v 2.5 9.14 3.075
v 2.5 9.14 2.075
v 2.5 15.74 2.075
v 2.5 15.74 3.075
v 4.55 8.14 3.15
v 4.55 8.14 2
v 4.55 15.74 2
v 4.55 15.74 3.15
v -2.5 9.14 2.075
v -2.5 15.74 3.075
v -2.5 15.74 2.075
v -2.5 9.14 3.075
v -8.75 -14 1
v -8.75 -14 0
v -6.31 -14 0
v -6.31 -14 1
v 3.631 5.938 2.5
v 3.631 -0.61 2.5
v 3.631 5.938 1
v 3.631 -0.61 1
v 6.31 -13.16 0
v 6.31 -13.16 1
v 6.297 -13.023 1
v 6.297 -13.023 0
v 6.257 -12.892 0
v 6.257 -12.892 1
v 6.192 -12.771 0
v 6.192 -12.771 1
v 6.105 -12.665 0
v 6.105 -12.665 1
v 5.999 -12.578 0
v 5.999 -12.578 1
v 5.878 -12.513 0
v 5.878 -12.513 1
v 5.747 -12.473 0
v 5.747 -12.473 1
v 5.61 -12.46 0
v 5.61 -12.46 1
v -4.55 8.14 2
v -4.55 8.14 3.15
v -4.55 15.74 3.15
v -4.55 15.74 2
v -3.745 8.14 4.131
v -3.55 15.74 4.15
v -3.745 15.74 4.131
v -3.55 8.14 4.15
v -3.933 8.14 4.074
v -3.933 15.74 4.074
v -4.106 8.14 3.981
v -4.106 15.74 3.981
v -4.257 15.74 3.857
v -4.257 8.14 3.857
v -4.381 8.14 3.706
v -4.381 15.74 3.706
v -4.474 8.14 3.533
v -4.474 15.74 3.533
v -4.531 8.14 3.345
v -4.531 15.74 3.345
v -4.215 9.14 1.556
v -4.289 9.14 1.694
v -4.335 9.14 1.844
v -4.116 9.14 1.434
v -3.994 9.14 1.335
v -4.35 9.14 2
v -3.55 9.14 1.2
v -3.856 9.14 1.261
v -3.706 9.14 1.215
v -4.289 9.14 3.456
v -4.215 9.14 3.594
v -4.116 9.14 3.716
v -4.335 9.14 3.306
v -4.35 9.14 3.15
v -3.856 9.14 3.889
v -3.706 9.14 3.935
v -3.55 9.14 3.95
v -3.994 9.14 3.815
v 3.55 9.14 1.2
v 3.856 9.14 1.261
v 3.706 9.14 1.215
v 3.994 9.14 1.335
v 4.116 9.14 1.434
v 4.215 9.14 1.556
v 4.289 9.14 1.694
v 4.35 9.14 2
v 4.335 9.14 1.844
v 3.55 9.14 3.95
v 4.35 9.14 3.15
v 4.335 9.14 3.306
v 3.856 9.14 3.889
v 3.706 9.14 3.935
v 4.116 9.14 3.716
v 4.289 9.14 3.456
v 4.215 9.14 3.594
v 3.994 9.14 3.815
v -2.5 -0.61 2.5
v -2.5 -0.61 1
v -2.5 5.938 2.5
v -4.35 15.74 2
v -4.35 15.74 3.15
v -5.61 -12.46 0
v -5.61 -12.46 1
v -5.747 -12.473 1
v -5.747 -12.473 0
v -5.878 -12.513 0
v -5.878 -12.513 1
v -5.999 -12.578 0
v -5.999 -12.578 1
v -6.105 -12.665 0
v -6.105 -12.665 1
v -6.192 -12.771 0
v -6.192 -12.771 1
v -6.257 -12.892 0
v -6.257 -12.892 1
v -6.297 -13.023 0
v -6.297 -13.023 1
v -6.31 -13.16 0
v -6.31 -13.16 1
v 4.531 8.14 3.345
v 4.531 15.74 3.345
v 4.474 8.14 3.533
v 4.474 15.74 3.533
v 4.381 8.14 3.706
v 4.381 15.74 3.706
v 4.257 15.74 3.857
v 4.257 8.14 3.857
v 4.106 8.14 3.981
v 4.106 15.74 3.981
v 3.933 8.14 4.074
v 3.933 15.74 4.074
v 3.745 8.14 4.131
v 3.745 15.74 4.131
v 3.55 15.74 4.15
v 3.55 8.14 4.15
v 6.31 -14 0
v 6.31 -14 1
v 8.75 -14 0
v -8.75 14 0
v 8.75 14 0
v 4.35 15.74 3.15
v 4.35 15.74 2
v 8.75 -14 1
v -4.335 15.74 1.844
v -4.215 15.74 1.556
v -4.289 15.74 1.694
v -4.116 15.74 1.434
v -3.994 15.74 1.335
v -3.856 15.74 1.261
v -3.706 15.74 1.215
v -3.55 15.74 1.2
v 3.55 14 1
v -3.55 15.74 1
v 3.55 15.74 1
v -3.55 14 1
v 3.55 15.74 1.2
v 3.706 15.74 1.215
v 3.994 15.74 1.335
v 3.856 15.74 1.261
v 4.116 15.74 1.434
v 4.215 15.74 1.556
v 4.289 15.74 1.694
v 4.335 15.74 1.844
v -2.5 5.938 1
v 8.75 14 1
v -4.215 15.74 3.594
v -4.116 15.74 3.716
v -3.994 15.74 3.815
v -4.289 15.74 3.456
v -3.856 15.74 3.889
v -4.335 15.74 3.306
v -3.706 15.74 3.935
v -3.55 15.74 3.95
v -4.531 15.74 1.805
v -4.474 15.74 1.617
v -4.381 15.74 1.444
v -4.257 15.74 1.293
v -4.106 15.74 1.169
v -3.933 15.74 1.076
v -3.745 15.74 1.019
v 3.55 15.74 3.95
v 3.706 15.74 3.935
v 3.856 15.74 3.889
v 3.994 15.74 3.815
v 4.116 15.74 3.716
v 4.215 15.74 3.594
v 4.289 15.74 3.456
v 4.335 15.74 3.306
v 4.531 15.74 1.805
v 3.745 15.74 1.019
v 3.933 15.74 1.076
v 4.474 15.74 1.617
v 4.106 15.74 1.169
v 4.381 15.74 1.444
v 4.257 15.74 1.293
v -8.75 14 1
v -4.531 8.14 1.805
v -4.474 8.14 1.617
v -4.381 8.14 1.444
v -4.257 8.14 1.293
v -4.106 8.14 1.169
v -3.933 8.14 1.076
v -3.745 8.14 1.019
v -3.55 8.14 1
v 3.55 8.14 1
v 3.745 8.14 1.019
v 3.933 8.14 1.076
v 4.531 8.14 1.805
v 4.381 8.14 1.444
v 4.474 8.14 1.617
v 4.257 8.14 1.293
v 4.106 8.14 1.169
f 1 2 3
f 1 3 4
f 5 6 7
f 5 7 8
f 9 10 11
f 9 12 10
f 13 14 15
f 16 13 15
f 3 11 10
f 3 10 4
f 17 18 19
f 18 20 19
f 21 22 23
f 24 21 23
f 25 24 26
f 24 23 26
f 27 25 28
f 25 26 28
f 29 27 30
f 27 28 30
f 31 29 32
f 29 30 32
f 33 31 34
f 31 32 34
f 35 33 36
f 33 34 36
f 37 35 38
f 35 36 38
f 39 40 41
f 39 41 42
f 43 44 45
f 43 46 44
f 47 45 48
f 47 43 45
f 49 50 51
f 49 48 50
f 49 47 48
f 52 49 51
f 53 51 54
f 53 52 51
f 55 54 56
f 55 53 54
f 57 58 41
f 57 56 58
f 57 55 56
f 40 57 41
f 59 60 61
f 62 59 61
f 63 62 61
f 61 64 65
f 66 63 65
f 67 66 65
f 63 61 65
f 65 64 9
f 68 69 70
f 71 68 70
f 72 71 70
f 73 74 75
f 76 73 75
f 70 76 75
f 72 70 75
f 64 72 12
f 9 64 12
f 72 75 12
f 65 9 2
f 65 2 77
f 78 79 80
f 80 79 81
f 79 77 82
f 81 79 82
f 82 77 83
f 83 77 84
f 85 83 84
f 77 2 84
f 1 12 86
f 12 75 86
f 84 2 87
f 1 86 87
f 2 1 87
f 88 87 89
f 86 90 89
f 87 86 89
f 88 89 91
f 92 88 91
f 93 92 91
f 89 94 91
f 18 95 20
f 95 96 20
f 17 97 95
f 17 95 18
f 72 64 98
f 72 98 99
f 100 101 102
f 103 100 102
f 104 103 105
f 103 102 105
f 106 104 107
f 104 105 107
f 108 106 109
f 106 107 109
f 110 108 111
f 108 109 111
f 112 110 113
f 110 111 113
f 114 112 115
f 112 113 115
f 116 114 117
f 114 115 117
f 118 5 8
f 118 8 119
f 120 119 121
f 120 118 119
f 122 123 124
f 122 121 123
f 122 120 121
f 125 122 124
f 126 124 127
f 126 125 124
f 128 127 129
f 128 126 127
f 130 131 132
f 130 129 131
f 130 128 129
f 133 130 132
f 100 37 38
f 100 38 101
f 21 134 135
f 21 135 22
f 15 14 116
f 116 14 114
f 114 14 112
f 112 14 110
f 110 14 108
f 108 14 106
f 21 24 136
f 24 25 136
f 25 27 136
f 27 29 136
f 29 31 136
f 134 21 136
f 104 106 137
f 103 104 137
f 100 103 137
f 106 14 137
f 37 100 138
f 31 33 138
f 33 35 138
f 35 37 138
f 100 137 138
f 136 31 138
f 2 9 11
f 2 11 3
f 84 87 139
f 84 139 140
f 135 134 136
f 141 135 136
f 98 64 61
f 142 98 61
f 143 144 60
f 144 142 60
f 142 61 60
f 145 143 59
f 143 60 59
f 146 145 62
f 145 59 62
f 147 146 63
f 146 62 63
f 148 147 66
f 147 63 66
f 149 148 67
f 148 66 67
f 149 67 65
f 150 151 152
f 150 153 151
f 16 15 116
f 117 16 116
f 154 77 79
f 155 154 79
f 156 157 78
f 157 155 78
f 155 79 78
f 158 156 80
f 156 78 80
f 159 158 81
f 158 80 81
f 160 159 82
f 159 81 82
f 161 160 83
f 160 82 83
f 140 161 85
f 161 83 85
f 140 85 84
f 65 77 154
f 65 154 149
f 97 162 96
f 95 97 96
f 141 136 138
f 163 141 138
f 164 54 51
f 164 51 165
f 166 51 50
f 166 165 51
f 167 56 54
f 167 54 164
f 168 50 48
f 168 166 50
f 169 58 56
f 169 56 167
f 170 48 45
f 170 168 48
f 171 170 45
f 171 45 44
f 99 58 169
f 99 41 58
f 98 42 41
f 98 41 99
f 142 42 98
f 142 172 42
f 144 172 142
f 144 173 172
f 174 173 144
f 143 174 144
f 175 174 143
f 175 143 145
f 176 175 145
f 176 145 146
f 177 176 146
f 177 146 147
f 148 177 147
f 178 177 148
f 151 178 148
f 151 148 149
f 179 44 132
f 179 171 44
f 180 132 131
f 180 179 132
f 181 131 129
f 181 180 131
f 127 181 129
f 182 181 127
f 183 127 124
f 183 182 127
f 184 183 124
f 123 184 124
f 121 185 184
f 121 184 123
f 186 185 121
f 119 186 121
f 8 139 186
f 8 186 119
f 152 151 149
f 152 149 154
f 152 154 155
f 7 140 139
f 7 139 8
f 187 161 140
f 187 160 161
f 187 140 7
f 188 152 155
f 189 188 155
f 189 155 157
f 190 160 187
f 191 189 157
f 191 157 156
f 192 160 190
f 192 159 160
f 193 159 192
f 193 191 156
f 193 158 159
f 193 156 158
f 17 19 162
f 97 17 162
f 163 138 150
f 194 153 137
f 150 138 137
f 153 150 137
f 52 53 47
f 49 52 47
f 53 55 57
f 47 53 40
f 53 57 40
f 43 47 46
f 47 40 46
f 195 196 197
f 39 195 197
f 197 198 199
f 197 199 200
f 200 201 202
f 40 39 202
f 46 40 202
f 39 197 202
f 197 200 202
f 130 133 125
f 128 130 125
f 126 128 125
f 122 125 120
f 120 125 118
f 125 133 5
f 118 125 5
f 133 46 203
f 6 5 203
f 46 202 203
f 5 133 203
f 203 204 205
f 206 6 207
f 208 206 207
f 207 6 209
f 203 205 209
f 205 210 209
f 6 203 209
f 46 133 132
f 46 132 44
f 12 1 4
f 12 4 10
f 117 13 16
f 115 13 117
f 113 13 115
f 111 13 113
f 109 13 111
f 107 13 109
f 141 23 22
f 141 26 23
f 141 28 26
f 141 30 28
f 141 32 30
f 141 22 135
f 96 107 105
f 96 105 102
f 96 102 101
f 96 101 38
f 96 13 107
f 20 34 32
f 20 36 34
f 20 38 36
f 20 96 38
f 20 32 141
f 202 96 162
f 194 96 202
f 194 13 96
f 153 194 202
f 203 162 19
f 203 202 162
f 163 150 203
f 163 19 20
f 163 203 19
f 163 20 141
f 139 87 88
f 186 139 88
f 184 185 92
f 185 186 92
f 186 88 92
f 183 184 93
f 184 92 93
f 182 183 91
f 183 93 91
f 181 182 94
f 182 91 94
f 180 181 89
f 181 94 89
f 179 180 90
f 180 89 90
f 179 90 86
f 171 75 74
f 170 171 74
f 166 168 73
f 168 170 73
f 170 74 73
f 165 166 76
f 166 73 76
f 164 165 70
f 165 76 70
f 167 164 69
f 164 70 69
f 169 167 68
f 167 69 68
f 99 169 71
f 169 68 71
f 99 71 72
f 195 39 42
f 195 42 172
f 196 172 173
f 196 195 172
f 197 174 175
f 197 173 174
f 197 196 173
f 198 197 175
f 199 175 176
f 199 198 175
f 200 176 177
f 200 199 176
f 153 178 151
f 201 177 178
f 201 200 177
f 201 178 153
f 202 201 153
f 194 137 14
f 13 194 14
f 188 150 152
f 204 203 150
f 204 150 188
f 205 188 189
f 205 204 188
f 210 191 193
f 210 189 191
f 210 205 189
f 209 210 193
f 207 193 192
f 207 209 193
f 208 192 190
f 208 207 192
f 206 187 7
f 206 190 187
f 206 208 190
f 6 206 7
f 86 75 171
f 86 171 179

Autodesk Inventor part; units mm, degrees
ref_plane "YZ Plane" through (0, 0, 0) normal (1, 0, 0) x (0, 1, 0)
ref_plane "XZ Plane" through (0, 0, 0) normal (0, 1, 0) x (-1, 0, 0)
ref_plane "XY Plane" through (0, 0, 0) normal (0, 0, 1) x (1, 0, 0)
sketch "스케치1" plane through (0, 0, 0) normal (0, 0, 1) x (1, 0, 0)
  line L0 (-8.75, -14) -> (8.75, -14)
  line L1 (8.75, -14) -> (8.75, 14)
  line L2 (8.75, 14) -> (-8.75, 14)
  line L3 (-8.75, 14) -> (-8.75, -14)
  line L4 (-8.75, -14) -> (8.75, 14) construction
  line L5 (8.75, -14) -> (-8.75, 14) construction
  line L6 (-8.75, -14) -> (-6.31, -14)
  line L7 (-6.31, -14) -> (-6.31, -12.46)
  line L8 (-6.31, -12.46) -> (0, -12.46)
  line L9 (0, 0) -> (0, 2.6603)
  line L10 (8.75, -14) -> (6.31, -14)
  line L11 (6.31, -14) -> (6.31, -12.46)
  line L12 (6.31, -12.46) -> (0, -12.46)
  dimension "d0" = 17.5
  dimension "d1" = 28
  dimension "d2" = 2.44
  dimension "d3" = 1.54
extrude "돌출1" add sketch "스케치1" along normal blind 1 contours L3 L2 L1 L0 L11 L12 L8 L7
sketch "스케치2" plane through (-8.75, 14, 0) normal (0, 1, 0) x (1, 0, 0)
  line L0 (5.2, -1) -> (12.3, -1)
  line L1 (13.3, -2) -> (13.3, -3.15)
  line L2 (12.3, -4.15) -> (5.2, -4.15)
  line L3 (4.2, -3.15) -> (4.2, -2)
  line L4 (4.2, -1) -> (13.3, -4.15) construction
  line L5 (13.3, -1) -> (4.2, -4.15) construction
  line L6 (17.5, -1) -> (0, -1) construction
  line L7 (6.25, -2.075) -> (11.25, -2.075)
  line L8 (11.25, -2.075) -> (11.25, -3.075)
  line L9 (11.25, -3.075) -> (6.25, -3.075)
  line L10 (6.25, -3.075) -> (6.25, -2.075)
  line L11 (6.25, -2.075) -> (11.25, -3.075) construction
  line L12 (11.25, -2.075) -> (6.25, -3.075) construction
  arc A0 (13.3, -2) -> (12.3, -1) centre (12.3, -2) ccw
  arc A1 (12.3, -4.15) -> (13.3, -3.15) centre (12.3, -3.15) ccw
  arc A2 (5.2, -1) -> (4.2, -2) centre (5.2, -2) ccw
  arc A3 (4.2, -3.15) -> (5.2, -4.15) centre (5.2, -3.15) ccw
  line L13 (13.1, -3.15) -> (13.1, -2)
  arc A4 (13.1, -2) -> (12.3, -1.2) centre (12.3, -2) ccw
  line L14 (12.3, -1.2) -> (5.2, -1.2)
  arc A5 (5.2, -1.2) -> (4.4, -2) centre (5.2, -2) ccw
  line L15 (4.4, -2) -> (4.4, -3.15)
  arc A6 (4.4, -3.15) -> (5.2, -3.95) centre (5.2, -3.15) ccw
  line L16 (5.2, -3.95) -> (12.3, -3.95)
  arc A7 (12.3, -3.95) -> (13.1, -3.15) centre (12.3, -3.15) ccw
  point P0 (8.75, 0)
  point P1 (8.75, -2.575)
  point P2 (8.75, -1)
  dimension "d6" = 3.15
  dimension "d7" = 9.1
  dimension "d8" = 5
  dimension "d9" = 1
  dimension "d10" = 1
  dimension "d11" = 0.2
extrude "돌출2" add sketch "스케치2" along normal blind 1.74 and the other way blind 5.86
fillet "모깎기1" radius 0.7 2 edges at (6.31, -12.46, 0.5) (-6.31, -12.46, 0.5)
sketch "스케치3" plane through (-8.75, 8.14, 0) normal (0, -1, 0) x (1, 0, 0)
  line L0 (12.3, 4.15) -> (5.2, 4.15) projected
  arc A0 (5.2, 4.15) -> (4.2, 3.15) centre (5.2, 3.15) ccw projected
  line L1 (4.2, 3.15) -> (4.2, 2) projected
  arc A1 (4.2, 2) -> (5.2, 1) centre (5.2, 2) ccw projected
  line L2 (12.3, 1) -> (5.2, 1) projected
  arc A2 (12.3, 1) -> (13.3, 2) centre (12.3, 2) ccw projected
  line L3 (13.3, 2) -> (13.3, 3.15) projected
  arc A3 (13.3, 3.15) -> (12.3, 4.15) centre (12.3, 3.15) ccw projected
  arc A4 (13.1, 3.15) -> (12.3, 3.95) centre (12.3, 3.15) ccw projected
  line L4 (13.1, 3.15) -> (13.1, 2) projected
  arc A5 (12.3, 1.2) -> (13.1, 2) centre (12.3, 2) ccw projected
  line L5 (12.3, 1.2) -> (5.2, 1.2) projected
  arc A6 (4.4, 2) -> (5.2, 1.2) centre (5.2, 2) ccw projected
  line L6 (4.4, 2) -> (4.4, 3.15) projected
  arc A7 (5.2, 3.95) -> (4.4, 3.15) centre (5.2, 3.15) ccw projected
  line L7 (5.2, 3.95) -> (12.3, 3.95) projected
  point P0 (8.75, 0)
extrude "돌출3" add sketch "스케치3" against normal blind 1 contours A3 L3 A2 L2 A1 L1 A0 L0 | L4 A5 L5 A6 L6 A7 L7 A4
sketch "스케치4" plane through (0, 0, 1) normal (0, 0, 1) x (1, 0, 0)
  line L0 (3.631, 5.9375) -> (-2.5, 5.9375)
  line L1 (-2.5, 5.9375) -> (-2.5, -0.6101)
  line L2 (-2.5, -0.6101) -> (3.631, -0.6101)
  line L3 (3.631, -0.6101) -> (3.631, 5.9375)
  line L4 (3.631, 5.9375) -> (-2.5, -0.6101) construction
  line L5 (-2.5, 5.9375) -> (3.631, -0.6101) construction
  point P0 (0, 0)
  point P1 (0.5655, 2.6637)
extrude "돌출4" add sketch "스케치4" along normal blind 1.5
properties part number "C타입 충전단자"
